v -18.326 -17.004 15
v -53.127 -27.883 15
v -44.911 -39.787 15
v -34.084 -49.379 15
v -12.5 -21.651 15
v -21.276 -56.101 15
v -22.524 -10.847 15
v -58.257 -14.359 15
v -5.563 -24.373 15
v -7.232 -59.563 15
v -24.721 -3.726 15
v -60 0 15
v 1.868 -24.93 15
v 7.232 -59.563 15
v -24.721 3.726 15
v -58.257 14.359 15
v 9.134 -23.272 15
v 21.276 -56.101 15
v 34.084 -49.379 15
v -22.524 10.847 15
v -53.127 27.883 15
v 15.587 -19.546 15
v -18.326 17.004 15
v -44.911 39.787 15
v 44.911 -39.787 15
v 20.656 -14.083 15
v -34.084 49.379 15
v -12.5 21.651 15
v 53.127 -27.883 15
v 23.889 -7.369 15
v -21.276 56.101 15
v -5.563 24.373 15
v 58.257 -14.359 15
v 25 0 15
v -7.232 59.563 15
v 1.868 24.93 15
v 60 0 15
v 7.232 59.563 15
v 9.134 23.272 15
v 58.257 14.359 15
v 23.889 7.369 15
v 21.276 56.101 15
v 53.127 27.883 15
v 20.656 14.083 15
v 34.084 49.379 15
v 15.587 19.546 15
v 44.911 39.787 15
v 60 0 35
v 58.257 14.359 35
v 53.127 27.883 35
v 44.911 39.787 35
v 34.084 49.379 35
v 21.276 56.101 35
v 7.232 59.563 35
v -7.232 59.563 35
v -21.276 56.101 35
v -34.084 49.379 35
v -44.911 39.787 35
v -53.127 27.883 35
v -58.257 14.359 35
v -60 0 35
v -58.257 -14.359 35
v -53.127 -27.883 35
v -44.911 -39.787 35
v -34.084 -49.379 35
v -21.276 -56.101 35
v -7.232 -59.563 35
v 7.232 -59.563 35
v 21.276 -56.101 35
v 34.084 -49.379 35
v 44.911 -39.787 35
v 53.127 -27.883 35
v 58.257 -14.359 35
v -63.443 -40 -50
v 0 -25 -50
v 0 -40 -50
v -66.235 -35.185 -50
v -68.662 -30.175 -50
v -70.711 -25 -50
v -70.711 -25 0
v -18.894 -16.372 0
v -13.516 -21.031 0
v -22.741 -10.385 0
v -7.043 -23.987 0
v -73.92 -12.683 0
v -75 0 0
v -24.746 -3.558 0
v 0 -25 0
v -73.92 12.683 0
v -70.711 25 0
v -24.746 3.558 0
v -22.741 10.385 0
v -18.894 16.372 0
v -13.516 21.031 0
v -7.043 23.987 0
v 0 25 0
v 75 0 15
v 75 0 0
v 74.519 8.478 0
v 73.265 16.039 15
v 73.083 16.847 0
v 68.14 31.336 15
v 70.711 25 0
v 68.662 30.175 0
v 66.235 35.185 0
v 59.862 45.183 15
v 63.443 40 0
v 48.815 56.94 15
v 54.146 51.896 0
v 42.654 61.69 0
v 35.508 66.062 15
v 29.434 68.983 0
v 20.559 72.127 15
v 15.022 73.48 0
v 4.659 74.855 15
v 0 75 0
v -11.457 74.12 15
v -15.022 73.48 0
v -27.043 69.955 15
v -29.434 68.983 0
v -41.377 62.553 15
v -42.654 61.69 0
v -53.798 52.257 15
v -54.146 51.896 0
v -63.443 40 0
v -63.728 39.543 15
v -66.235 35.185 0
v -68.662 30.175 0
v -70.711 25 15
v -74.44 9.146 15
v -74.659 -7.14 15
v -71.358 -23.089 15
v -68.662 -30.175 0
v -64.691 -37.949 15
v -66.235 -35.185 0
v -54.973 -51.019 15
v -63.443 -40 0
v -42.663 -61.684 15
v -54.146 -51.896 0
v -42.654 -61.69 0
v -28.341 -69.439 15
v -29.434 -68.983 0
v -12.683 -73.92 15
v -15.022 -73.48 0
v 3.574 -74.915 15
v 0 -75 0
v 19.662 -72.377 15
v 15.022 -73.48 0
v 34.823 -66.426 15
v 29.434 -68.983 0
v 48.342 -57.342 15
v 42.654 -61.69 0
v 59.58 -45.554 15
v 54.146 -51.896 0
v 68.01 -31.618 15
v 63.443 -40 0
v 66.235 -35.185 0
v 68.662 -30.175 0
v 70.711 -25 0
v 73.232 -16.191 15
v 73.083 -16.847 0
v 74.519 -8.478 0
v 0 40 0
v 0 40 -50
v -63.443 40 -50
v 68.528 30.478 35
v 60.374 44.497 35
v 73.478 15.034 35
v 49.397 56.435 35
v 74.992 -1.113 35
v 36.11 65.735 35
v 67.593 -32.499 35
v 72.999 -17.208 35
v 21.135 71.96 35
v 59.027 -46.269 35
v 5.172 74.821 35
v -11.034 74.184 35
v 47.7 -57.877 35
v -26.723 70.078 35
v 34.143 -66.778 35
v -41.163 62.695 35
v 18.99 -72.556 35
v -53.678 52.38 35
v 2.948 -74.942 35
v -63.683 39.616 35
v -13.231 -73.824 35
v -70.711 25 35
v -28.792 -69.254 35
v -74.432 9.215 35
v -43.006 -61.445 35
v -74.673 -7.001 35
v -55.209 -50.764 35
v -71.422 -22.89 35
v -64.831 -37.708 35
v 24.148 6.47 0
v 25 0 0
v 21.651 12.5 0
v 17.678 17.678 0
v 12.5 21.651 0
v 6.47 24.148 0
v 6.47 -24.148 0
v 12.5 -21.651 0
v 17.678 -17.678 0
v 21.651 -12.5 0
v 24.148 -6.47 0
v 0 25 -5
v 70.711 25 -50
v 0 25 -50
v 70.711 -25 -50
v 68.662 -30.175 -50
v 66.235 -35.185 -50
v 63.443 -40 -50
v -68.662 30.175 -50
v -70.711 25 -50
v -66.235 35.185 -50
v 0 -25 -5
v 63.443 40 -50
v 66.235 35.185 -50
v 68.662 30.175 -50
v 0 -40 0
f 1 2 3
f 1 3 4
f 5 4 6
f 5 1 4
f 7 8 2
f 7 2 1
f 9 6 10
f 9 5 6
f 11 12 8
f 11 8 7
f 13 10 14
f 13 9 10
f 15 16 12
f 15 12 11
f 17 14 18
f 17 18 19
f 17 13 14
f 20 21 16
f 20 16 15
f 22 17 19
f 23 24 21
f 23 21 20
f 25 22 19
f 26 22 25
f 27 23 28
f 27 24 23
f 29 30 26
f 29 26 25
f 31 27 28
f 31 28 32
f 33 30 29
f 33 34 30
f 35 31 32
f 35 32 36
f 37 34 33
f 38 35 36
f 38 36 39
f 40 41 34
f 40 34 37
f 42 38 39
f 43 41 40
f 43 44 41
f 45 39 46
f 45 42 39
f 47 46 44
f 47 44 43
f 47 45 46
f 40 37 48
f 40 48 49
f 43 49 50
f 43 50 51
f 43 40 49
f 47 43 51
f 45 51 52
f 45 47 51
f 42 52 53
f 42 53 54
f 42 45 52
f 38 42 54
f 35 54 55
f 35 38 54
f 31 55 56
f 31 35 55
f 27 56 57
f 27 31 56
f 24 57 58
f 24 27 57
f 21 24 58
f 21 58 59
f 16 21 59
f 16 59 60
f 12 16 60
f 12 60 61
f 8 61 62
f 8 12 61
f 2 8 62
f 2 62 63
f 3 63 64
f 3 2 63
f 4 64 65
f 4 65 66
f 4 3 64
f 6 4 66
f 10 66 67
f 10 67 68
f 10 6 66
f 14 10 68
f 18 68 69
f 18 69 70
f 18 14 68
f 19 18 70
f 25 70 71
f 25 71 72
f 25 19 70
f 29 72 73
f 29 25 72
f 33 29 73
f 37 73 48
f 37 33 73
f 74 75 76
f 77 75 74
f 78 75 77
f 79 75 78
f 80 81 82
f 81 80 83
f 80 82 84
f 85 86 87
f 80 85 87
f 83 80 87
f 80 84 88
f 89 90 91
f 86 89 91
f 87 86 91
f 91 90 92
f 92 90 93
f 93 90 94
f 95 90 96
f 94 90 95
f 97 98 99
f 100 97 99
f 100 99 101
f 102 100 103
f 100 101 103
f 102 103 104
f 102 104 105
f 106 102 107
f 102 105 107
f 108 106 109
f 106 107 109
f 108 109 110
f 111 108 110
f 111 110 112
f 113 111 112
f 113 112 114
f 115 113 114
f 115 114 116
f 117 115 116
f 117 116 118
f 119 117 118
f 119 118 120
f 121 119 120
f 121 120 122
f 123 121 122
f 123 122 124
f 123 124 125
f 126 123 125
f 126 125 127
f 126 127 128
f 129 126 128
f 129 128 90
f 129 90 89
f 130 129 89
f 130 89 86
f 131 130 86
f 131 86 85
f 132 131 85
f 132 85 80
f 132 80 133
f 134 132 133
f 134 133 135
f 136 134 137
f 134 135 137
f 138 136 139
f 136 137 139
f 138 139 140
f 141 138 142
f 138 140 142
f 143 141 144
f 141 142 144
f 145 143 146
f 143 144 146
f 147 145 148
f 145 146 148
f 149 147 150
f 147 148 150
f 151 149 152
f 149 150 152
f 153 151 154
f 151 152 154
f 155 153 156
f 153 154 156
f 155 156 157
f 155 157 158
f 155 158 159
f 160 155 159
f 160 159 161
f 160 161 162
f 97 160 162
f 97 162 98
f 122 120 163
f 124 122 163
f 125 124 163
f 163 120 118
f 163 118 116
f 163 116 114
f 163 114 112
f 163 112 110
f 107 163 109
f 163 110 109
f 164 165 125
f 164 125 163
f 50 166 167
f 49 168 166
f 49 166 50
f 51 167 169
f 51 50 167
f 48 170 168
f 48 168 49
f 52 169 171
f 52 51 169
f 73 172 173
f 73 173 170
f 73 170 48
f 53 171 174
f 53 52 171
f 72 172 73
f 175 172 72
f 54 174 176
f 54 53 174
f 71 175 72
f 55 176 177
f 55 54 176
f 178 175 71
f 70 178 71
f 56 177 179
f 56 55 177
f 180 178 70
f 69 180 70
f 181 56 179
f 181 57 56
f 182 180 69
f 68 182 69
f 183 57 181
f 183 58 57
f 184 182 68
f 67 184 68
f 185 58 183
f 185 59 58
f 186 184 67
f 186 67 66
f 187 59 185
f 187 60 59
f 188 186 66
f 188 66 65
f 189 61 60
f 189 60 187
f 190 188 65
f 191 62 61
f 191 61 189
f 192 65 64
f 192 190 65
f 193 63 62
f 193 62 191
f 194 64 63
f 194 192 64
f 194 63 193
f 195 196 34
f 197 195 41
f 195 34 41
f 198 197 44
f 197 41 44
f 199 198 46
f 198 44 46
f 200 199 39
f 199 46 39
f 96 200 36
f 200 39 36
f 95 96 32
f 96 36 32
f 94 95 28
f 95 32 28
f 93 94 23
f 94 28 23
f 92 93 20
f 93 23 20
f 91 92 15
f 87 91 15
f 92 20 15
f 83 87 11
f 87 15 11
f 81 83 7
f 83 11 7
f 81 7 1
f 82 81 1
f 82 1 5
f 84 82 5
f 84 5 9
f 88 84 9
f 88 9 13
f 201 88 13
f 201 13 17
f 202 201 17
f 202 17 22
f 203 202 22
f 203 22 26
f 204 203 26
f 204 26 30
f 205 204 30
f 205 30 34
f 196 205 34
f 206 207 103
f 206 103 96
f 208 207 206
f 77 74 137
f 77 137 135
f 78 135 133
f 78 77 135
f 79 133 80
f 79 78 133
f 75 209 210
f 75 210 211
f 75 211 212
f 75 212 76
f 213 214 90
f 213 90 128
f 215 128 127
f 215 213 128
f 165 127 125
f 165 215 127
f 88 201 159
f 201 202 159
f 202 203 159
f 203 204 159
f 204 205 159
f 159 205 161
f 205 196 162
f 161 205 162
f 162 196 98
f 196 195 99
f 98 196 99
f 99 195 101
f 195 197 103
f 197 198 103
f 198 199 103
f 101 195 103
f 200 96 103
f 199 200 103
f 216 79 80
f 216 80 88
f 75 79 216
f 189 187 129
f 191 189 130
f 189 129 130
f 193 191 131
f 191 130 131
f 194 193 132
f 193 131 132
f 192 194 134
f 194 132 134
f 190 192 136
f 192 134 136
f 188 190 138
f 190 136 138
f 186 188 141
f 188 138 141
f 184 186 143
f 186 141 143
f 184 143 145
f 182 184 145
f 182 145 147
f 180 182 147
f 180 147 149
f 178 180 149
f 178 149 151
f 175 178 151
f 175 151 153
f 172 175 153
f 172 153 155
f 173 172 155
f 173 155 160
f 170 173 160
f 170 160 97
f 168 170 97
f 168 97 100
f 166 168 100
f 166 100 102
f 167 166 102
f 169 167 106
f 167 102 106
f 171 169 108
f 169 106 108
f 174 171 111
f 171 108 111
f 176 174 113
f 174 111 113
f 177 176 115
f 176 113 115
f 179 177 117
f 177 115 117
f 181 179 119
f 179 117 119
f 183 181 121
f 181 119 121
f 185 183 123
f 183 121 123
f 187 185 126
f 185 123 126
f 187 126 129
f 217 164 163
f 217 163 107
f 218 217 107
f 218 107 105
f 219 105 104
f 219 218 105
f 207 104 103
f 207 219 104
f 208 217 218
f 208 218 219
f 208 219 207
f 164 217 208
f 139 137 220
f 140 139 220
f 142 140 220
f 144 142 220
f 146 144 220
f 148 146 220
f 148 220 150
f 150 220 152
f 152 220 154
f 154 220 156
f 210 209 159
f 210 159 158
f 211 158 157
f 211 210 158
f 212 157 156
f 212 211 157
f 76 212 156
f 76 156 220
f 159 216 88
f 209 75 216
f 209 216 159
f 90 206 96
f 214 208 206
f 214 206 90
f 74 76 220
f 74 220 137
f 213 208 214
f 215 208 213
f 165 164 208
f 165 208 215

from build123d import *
from build123d.topology import SkipClean

# Parameters (mm, degrees)
CROQUIS1_R              = 75
SALIENTE_EXTRUIR1_DEPTH = 15
SALIENTE_EXTRUIR2_START = 50
SALIENTE_EXTRUIR2_DEPTH = 50
CROQUIS3_R              = 75
CROQUIS3_R_2            = 60
SALIENTE_EXTRUIR3_DEPTH = 20
CROQUIS4_R              = 25
CORTAR_EXTRUIR1_DEPTH   = 20


with BuildPart() as part:
    # Croquis1 → Saliente-Extruir1 (new body)
    with BuildSketch(Plane.XY):
        Circle(CROQUIS1_R)
    extrude(amount=SALIENTE_EXTRUIR1_DEPTH)

    # Croquis2 → Saliente-Extruir2 (add)
    with SkipClean():  # the faces are left unmerged after this step: merging them gives an invalid solid
        with BuildSketch(Plane(origin=(0, 0, 0), x_dir=(-1, 0, 0), z_dir=(0, 0, -1)).offset(SALIENTE_EXTRUIR2_START)):
            with BuildLine():
                Line((-70.710678119, 25), (0, 25))
                Line((0, 25), (0, 40))
                Line((0, 40), (-63.442887702, 40))
                ThreePointArc((-63.442887702, 40), (-67.494776136, 32.70252581), (-70.710678119, 25))
            make_face()
            with BuildLine():
                Line((0, 40), (0, 25))
                Line((0, 25), (70.710678119, 25))
                ThreePointArc((70.710678119, 25), (67.494776136, 32.70252581), (63.442887702, 40))
                Line((63.442887702, 40), (0, 40))
            make_face()
            with BuildLine():
                Line((-70.710678119, 25), (0, 25))
                Line((0, 25), (0, 40))
                Line((0, 40), (-63.442887702, 40))
                ThreePointArc((-63.442887702, 40), (-67.494776136, 32.70252581), (-70.710678119, 25))
            make_face()
            with BuildLine():
                Line((0, -40), (0, -25))
                Line((0, -25), (-70.710678119, -25))
                ThreePointArc((-70.710678119, -25), (-67.494776136, -32.70252581), (-63.442887702, -40))
                Line((-63.442887702, -40), (0, -40))
            make_face()
            with BuildLine():
                Line((70.710678119, -25), (0, -25))
                Line((0, -25), (0, -40))
                Line((0, -40), (63.442887702, -40))
                ThreePointArc((63.442887702, -40), (67.494776136, -32.70252581), (70.710678119, -25))
            make_face()
            with BuildLine():
                Line((0, -40), (0, -25))
                Line((0, -25), (-70.710678119, -25))
                ThreePointArc((-70.710678119, -25), (-67.494776136, -32.70252581), (-63.442887702, -40))
                Line((-63.442887702, -40), (0, -40))
            make_face()
            with BuildLine():
                Line((70.710678119, -25), (0, -25))
                Line((0, -25), (0, -40))
                Line((0, -40), (63.442887702, -40))
                ThreePointArc((63.442887702, -40), (67.494776136, -32.70252581), (70.710678119, -25))
            make_face()
        extrude(amount=-SALIENTE_EXTRUIR2_DEPTH)

    # Croquis3 → Saliente-Extruir3 (add)
    with SkipClean():  # the faces are left unmerged after this step: merging them gives an invalid solid
        with BuildSketch(Plane.XY.offset(15)):
            with Locations(Location((0, 0, 0), (0, 0, 160.528779366))):
                Circle(CROQUIS3_R)
            Circle(CROQUIS3_R_2, mode=Mode.SUBTRACT)
        extrude(amount=SALIENTE_EXTRUIR3_DEPTH)

    # Croquis4 → Cortar-Extruir1 (cut)
    with SkipClean():  # the faces are left unmerged after this step: merging them gives an invalid solid
        with BuildSketch(Plane.XY.offset(15)):
            Circle(CROQUIS4_R)
        extrude(amount=-CORTAR_EXTRUIR1_DEPTH, mode=Mode.SUBTRACT)


solid = part.part
